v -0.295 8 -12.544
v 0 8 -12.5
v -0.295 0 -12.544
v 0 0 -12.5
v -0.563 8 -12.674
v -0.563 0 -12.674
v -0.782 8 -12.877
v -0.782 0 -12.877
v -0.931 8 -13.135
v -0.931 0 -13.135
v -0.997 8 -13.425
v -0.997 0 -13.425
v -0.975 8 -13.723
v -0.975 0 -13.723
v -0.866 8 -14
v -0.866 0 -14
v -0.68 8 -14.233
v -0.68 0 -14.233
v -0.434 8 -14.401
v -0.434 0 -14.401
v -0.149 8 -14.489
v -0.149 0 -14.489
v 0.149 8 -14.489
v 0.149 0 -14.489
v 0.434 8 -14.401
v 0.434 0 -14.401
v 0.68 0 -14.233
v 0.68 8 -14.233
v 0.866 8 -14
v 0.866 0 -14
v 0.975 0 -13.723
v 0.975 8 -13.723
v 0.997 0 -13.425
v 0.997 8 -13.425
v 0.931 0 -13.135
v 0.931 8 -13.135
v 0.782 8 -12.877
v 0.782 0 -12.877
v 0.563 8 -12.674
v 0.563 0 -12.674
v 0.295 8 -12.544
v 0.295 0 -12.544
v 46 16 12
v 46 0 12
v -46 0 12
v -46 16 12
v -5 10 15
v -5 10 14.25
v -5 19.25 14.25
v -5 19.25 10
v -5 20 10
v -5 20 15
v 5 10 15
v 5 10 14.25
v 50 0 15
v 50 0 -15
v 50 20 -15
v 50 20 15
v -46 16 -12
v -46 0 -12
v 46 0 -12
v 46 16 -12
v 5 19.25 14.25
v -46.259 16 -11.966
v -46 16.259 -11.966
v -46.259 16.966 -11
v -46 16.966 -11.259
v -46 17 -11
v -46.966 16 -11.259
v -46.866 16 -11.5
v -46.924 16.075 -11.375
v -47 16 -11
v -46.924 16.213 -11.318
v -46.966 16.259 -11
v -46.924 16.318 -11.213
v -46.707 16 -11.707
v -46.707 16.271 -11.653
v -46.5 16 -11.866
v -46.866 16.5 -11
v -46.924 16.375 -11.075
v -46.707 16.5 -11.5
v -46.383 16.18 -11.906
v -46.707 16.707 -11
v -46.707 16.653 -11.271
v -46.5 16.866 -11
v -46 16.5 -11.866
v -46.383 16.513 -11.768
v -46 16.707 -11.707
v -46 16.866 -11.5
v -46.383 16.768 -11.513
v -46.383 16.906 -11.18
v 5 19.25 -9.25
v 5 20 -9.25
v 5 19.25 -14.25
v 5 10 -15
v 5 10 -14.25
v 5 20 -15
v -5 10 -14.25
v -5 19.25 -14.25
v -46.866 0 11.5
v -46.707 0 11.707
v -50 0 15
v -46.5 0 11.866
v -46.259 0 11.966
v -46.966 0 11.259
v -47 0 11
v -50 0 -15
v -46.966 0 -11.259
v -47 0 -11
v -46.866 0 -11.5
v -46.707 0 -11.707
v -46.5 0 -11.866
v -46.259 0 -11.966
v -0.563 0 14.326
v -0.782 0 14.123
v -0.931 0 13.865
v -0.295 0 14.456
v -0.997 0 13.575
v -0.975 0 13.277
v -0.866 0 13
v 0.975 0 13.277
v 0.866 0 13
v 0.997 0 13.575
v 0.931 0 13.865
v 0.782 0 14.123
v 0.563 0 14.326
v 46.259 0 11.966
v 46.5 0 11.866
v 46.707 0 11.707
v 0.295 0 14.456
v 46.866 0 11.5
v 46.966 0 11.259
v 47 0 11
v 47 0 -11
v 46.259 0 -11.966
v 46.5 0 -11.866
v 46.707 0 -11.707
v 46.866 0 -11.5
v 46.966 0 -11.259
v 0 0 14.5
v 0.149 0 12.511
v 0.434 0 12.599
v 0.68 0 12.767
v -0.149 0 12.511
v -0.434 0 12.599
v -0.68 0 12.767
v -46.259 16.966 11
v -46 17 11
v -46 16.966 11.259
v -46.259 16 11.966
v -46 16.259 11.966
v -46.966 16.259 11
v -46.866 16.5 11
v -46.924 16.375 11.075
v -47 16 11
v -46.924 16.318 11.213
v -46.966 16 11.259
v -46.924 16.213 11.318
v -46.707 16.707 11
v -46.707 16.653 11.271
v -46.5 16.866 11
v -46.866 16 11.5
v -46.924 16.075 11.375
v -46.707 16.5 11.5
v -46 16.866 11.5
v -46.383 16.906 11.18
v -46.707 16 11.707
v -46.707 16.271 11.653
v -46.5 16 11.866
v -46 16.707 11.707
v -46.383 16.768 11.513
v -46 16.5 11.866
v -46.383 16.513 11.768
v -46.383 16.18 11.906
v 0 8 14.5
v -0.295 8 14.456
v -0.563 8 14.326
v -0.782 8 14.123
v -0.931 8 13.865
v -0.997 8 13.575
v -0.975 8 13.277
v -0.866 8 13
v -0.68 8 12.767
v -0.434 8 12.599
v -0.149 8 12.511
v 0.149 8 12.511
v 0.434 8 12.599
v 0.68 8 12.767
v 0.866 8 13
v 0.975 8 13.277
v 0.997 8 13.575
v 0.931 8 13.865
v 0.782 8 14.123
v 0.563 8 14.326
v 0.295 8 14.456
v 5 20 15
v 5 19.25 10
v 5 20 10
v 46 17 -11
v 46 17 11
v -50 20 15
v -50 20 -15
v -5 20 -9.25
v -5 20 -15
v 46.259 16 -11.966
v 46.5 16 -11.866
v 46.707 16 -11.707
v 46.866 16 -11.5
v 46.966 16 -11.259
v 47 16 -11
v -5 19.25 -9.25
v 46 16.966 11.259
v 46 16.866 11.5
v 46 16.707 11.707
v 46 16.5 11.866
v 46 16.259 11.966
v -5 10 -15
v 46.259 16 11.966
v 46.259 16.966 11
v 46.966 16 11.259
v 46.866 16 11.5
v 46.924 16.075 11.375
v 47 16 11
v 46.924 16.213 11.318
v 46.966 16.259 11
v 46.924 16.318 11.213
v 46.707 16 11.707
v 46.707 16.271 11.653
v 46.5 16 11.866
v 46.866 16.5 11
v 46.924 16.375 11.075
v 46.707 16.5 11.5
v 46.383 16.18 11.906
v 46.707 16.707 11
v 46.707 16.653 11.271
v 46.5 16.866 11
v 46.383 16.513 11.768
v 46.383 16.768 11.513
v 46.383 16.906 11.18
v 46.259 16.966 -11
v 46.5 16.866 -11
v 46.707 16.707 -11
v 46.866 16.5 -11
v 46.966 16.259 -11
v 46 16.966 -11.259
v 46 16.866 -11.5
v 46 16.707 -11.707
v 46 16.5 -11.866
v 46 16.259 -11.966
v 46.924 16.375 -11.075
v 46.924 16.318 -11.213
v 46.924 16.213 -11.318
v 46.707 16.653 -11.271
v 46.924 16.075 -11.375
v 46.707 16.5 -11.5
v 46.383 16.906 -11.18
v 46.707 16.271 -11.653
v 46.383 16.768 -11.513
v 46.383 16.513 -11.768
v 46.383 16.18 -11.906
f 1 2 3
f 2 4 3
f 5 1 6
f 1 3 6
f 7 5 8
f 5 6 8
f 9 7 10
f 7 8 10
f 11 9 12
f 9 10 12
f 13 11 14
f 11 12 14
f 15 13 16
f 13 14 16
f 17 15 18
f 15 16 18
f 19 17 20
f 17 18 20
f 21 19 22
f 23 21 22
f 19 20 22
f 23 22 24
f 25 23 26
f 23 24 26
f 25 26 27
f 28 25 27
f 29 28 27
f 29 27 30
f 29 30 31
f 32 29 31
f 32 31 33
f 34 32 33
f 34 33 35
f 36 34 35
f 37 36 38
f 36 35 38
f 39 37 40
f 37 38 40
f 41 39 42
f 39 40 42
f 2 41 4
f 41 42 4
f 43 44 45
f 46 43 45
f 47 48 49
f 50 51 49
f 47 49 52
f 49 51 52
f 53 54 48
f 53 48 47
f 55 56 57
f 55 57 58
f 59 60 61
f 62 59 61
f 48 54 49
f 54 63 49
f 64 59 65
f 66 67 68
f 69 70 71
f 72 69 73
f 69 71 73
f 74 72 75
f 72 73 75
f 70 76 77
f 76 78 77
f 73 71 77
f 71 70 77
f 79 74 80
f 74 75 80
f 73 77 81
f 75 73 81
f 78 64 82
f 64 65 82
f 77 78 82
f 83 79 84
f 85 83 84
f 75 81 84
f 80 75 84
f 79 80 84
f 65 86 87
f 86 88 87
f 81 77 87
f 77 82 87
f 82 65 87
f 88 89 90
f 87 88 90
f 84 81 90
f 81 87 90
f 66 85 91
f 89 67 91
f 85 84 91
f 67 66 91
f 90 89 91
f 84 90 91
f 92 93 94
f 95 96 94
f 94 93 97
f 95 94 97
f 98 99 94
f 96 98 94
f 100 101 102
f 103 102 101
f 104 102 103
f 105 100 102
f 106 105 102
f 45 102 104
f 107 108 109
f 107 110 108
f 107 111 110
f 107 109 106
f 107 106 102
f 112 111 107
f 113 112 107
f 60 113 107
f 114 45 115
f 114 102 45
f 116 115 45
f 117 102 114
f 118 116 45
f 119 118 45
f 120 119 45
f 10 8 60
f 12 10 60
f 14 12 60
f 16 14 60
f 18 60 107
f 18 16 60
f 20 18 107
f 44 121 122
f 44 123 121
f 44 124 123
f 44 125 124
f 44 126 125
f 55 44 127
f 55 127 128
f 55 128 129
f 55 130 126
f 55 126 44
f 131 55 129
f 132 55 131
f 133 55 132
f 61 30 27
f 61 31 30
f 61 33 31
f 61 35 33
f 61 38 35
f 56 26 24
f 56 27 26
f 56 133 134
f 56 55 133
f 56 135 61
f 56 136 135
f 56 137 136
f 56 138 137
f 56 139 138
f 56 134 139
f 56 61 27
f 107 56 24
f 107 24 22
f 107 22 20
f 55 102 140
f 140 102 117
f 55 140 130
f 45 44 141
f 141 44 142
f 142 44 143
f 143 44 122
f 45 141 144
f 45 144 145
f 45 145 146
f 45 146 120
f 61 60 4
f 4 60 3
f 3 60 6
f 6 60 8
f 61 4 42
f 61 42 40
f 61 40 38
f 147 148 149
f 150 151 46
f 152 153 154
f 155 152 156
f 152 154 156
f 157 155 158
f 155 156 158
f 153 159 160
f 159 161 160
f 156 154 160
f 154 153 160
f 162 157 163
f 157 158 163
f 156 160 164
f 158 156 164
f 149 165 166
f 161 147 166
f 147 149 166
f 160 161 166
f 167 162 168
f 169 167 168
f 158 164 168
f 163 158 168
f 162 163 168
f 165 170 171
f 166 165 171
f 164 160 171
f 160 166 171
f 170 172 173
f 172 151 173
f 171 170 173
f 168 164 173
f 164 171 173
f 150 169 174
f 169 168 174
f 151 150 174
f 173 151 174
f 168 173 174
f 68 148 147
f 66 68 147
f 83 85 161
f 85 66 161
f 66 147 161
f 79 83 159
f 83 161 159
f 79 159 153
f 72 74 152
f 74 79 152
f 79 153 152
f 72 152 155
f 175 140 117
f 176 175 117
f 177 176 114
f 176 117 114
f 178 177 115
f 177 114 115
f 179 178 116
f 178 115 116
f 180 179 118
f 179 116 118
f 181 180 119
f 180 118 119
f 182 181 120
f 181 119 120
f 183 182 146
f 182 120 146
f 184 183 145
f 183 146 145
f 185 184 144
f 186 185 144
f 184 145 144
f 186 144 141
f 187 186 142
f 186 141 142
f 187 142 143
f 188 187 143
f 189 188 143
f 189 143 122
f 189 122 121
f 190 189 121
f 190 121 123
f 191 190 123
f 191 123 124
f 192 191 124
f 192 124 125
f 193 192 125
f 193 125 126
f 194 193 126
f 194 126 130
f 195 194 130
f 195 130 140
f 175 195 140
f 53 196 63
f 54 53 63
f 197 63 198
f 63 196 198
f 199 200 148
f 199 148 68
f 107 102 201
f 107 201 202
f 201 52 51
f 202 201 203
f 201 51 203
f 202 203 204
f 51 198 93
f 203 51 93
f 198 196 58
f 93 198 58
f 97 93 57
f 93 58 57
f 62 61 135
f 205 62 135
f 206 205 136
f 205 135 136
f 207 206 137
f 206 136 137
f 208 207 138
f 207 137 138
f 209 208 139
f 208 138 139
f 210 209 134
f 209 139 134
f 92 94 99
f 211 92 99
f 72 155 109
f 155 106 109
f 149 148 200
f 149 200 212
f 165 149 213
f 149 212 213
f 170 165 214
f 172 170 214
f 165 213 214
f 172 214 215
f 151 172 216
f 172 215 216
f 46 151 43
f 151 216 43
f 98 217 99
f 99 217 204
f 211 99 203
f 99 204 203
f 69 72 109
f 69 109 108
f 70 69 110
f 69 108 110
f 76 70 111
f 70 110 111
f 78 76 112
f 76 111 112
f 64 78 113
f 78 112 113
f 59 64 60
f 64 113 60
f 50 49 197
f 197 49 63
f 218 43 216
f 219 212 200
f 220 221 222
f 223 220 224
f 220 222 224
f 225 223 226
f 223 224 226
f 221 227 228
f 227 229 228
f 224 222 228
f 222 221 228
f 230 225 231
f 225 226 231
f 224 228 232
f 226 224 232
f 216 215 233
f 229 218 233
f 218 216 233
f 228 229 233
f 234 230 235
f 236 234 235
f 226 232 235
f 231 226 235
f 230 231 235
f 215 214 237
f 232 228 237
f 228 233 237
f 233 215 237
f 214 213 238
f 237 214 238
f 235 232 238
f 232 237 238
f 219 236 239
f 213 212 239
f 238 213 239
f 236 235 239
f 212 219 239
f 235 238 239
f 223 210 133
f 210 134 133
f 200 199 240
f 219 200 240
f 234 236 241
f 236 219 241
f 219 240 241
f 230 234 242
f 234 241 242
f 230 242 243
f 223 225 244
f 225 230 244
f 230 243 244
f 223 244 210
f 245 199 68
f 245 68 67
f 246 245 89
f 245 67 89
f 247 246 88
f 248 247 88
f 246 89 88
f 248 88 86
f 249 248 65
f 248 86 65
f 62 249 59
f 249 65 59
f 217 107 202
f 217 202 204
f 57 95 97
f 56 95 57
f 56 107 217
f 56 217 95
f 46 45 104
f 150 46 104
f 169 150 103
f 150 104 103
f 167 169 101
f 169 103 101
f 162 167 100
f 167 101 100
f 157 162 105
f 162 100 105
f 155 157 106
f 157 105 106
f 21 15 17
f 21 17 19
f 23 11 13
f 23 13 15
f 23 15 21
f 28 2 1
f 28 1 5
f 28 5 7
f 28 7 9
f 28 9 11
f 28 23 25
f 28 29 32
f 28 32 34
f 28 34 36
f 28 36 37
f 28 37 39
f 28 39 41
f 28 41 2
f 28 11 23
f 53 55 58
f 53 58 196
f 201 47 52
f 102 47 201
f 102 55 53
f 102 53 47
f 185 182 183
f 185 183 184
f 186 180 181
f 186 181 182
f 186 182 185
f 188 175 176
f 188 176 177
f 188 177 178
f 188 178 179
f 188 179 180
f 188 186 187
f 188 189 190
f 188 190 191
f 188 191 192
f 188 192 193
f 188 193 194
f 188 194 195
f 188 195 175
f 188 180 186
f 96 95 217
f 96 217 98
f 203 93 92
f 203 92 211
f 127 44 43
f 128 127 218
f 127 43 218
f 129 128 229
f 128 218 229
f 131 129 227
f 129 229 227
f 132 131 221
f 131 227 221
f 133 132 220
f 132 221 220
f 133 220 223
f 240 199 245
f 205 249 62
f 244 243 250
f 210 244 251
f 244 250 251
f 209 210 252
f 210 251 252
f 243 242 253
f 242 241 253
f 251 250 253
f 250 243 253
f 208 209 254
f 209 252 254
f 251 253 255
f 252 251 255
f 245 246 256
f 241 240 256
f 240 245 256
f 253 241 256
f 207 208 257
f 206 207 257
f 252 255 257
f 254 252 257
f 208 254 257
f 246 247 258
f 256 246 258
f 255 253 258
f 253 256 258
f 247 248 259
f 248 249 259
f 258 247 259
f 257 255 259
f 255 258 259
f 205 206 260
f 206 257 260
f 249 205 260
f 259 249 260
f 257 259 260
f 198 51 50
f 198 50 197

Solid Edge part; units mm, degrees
sketch "Sketch1" plane through (0, 0, 0) normal (0, -1, 0) x (1, 0, 0)
  line L0 (50, 15) -> (-50, 15)
  line L1 (-50, 15) -> (-50, -15)
  line L2 (-50, -15) -> (50, -15)
  line L3 (50, -15) -> (50, 15)
extrude "Protrusion1" add sketch "Sketch1" against normal blind 20
shell "Thinwall_2" thickness 3 removed faces 1 at (-32.3333, 0, 10.3)
fillet "Round_4" radius 1 8 edges at (0, 17, 12) (0, 17, -12) (-47, 8.5, -12) (-47, 17, 0) (47, 17, 0) (47, 8.5, 12) (47, 8.5, -12) (-47, 8.5, 12)
sketch "Sketch2" plane through (0, 20, 0) normal (0, 1, 0) x (1, 0, 0)
  line L0 (-5, -15.75) -> (5, -15.75)
  line L1 (5, -15.75) -> (5, -14.25)
  line L2 (5, -14.25) -> (-5, -14.25)
  line L3 (-5, -14.25) -> (-5, -15.75)
  line L4 (-5, 14.25) -> (5, 14.25)
  line L5 (5, 14.25) -> (5, 15.75)
  line L6 (5, 15.75) -> (-5, 15.75)
  line L7 (-5, 15.75) -> (-5, 14.25)
extrude "ExtrudedCutout_3" cut sketch "Sketch2" against normal blind 10
sketch "Sketch3" plane through (0, 10, 15) normal (0, 0, 1) x (1, 0, 0)
  line L0 (-5, 9.25) -> (5, 9.25)
  line L1 (5, 9.25) -> (5, 10.75)
  line L2 (5, 10.75) -> (-5, 10.75)
  line L3 (-5, 10.75) -> (-5, 9.25)
extrude "ExtrudedCutout_4" cut sketch "Sketch3" against normal blind 5
sketch "Sketch4" plane through (0, 15, -14.25) normal (0, 0, -1) x (1, 0, 0)
  line L0 (-5, -5.75) -> (5, -5.75)
  line L1 (5, -5.75) -> (5, -4.25)
  line L2 (5, -4.25) -> (-5, -4.25)
  line L3 (-5, -4.25) -> (-5, -5.75)
extrude "ExtrudedCutout_5" cut sketch "Sketch4" against normal blind 5
sketch "Sketch5" plane through (0, 0, 0) normal (0, -1, 0) x (0, 0, 1)
  circle A0 centre (13.5, 0) radius 1
  circle A1 centre (-13.5, 0) radius 1
extrude "ExtrudedCutout_6" cut sketch "Sketch5" against normal blind 8
